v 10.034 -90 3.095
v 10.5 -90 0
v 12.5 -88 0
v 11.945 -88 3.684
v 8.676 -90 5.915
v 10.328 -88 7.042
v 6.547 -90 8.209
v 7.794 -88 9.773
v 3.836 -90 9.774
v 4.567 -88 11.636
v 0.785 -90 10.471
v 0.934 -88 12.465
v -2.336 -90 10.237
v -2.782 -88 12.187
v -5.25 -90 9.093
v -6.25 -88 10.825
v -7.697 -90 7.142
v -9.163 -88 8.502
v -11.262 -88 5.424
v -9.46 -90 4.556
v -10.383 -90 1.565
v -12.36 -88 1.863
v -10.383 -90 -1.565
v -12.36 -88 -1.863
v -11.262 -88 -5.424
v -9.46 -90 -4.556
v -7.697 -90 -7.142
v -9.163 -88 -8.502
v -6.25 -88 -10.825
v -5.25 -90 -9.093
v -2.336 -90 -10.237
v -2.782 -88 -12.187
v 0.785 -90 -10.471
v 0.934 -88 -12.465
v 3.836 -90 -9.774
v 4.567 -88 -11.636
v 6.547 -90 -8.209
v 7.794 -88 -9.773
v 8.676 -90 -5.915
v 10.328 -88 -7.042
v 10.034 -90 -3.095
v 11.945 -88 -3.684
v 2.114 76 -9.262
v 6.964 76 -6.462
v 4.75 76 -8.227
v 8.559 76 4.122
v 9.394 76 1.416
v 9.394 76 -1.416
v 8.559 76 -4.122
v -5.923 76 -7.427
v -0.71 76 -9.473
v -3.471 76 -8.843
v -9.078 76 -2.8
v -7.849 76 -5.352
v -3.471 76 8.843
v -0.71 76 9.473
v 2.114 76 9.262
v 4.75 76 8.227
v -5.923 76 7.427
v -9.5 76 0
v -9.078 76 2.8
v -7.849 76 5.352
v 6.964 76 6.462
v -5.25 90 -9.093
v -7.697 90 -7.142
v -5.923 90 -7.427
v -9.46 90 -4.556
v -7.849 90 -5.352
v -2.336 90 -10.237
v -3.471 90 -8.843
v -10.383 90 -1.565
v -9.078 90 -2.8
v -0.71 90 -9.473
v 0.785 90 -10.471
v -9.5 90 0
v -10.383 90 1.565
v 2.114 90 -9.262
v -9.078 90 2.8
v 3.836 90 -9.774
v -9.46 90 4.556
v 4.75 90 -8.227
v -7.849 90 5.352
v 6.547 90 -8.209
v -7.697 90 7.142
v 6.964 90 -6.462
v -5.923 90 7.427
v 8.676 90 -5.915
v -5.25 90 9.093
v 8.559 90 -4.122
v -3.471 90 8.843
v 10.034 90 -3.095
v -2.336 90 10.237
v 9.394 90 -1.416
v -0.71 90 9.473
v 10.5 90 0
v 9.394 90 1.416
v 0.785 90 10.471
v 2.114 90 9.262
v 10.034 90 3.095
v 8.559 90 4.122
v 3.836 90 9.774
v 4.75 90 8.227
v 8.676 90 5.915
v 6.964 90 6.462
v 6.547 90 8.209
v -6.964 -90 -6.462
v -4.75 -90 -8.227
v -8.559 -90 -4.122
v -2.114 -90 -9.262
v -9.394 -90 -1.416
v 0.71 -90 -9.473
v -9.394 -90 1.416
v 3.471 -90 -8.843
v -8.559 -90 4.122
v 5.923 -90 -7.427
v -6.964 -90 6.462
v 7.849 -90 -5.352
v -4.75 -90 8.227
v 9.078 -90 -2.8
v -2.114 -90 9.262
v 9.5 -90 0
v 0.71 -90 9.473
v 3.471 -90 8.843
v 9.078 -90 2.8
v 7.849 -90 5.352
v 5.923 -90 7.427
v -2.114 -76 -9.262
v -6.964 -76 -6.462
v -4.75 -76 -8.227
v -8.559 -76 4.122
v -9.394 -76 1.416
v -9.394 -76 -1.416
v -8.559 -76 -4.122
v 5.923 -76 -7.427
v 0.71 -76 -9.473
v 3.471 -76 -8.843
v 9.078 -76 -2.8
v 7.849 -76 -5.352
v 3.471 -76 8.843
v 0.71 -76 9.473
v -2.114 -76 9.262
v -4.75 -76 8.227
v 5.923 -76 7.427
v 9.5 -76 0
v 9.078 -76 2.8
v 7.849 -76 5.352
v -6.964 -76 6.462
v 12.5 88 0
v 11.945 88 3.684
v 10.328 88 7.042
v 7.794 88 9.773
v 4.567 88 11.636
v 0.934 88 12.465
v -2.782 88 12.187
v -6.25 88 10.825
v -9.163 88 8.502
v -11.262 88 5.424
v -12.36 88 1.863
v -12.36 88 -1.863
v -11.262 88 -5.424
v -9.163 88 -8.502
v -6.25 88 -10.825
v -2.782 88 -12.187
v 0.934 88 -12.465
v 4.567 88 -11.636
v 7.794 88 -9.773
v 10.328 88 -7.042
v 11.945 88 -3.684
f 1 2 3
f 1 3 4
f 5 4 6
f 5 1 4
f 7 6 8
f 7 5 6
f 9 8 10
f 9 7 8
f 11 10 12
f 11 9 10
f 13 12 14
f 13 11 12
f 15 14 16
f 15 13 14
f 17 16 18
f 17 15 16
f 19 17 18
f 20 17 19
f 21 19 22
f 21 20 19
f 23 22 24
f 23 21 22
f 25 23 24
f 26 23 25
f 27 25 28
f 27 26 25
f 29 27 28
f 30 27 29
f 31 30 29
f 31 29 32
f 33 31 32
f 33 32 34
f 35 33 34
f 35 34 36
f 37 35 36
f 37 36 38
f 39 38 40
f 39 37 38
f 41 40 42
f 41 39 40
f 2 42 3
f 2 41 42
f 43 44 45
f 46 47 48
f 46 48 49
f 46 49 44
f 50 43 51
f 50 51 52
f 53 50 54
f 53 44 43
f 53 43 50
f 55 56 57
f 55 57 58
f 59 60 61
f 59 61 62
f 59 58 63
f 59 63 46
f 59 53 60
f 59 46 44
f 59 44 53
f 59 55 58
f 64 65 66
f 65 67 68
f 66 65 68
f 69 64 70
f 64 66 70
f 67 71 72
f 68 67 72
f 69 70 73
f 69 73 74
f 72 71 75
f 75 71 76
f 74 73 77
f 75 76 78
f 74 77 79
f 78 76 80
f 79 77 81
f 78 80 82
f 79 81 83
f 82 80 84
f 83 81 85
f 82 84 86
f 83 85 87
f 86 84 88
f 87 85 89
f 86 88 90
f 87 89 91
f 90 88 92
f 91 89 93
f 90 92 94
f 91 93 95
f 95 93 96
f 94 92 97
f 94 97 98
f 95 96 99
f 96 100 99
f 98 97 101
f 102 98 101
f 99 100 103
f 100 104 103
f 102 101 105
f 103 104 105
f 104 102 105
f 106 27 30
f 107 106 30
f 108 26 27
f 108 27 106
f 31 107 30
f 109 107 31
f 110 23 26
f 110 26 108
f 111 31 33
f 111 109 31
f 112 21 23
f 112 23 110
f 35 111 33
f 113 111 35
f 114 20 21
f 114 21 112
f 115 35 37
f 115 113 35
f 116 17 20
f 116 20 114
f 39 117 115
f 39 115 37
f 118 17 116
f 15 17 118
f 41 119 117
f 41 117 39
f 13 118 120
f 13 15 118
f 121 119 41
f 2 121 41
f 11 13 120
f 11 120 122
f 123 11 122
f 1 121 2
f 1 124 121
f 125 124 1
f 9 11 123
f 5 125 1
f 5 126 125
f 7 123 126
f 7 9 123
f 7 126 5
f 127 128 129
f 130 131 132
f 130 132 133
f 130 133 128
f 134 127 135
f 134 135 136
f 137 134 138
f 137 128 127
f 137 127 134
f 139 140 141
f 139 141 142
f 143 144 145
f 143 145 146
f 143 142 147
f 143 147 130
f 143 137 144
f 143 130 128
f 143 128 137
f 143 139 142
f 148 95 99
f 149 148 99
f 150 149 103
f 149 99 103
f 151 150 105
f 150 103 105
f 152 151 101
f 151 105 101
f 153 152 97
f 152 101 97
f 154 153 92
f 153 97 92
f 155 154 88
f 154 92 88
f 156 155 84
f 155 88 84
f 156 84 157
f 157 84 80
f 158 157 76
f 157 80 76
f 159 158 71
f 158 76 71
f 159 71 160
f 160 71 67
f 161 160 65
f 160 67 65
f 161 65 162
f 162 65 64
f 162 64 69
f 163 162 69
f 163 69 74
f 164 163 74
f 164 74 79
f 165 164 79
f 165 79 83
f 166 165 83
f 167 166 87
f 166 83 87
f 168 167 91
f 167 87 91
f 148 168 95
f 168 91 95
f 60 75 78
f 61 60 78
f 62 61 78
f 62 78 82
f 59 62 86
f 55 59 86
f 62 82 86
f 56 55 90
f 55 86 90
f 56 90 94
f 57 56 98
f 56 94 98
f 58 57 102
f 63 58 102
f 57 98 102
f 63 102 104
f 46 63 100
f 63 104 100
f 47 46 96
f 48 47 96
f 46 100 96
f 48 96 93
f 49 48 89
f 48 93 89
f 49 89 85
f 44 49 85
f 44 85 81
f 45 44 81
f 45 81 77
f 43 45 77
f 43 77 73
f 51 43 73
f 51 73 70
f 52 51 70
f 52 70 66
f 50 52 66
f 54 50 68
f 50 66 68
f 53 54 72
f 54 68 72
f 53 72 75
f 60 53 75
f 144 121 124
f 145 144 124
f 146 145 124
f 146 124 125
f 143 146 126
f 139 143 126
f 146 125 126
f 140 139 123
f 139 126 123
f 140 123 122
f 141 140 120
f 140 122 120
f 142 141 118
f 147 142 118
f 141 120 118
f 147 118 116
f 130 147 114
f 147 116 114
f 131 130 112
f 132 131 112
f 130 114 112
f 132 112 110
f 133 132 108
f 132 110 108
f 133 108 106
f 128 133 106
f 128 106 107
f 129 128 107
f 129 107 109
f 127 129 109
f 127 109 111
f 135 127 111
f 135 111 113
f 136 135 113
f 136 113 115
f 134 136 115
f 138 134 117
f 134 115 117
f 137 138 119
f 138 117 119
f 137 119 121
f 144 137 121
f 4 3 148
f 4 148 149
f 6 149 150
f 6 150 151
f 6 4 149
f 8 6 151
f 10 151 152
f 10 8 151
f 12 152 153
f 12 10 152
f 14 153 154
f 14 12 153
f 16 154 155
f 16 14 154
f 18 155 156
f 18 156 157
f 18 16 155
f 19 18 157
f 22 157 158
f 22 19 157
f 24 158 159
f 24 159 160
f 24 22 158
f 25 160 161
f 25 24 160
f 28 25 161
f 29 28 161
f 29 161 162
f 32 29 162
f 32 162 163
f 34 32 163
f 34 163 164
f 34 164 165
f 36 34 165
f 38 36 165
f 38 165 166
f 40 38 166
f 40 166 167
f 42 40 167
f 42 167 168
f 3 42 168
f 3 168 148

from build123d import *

# Parameters (mm, degrees)
F0_R          = 12.5
F1_DEPTH      = 90
F1_DEPTH_BACK = 90
F2_R          = 9.5
F3_DEPTH      = 14
F4_SIZE       = 2
F5_R          = 9.5
F6_DEPTH      = 14
F7_SIZE       = 2


with BuildPart() as f1:
    # F0 (on Front) → F1 (new body, two sides)
    with BuildSketch(Plane.XZ) as f1_sk:
        Circle(F0_R)
    extrude(amount=F1_DEPTH)
    extrude(f1_sk.sketch, amount=-F1_DEPTH_BACK)

    # F2 (on face) → F3 (cut)
    with BuildSketch(Plane.XZ.offset(90)):
        Circle(F2_R)
    extrude(amount=-F3_DEPTH, mode=Mode.SUBTRACT)

    # F4
    f4_edges = [f1.edges().sort_by_distance(p)[0] for p in [
        (-12.5, -90, 0),
    ]]
    chamfer(f4_edges, length=F4_SIZE)

    # F5 (on face) → F6 (cut)
    with BuildSketch(Plane(origin=(0, 90, 0), x_dir=(-1, 0, 0), z_dir=(0, 1, 0))):
        Circle(F5_R)
    extrude(amount=-F6_DEPTH, mode=Mode.SUBTRACT)

    # F7
    f7_edges = [f1.edges().sort_by_distance(p)[0] for p in [
        (-12.5, 90, 0),
    ]]
    chamfer(f7_edges, length=F7_SIZE)


solid = f1.part
